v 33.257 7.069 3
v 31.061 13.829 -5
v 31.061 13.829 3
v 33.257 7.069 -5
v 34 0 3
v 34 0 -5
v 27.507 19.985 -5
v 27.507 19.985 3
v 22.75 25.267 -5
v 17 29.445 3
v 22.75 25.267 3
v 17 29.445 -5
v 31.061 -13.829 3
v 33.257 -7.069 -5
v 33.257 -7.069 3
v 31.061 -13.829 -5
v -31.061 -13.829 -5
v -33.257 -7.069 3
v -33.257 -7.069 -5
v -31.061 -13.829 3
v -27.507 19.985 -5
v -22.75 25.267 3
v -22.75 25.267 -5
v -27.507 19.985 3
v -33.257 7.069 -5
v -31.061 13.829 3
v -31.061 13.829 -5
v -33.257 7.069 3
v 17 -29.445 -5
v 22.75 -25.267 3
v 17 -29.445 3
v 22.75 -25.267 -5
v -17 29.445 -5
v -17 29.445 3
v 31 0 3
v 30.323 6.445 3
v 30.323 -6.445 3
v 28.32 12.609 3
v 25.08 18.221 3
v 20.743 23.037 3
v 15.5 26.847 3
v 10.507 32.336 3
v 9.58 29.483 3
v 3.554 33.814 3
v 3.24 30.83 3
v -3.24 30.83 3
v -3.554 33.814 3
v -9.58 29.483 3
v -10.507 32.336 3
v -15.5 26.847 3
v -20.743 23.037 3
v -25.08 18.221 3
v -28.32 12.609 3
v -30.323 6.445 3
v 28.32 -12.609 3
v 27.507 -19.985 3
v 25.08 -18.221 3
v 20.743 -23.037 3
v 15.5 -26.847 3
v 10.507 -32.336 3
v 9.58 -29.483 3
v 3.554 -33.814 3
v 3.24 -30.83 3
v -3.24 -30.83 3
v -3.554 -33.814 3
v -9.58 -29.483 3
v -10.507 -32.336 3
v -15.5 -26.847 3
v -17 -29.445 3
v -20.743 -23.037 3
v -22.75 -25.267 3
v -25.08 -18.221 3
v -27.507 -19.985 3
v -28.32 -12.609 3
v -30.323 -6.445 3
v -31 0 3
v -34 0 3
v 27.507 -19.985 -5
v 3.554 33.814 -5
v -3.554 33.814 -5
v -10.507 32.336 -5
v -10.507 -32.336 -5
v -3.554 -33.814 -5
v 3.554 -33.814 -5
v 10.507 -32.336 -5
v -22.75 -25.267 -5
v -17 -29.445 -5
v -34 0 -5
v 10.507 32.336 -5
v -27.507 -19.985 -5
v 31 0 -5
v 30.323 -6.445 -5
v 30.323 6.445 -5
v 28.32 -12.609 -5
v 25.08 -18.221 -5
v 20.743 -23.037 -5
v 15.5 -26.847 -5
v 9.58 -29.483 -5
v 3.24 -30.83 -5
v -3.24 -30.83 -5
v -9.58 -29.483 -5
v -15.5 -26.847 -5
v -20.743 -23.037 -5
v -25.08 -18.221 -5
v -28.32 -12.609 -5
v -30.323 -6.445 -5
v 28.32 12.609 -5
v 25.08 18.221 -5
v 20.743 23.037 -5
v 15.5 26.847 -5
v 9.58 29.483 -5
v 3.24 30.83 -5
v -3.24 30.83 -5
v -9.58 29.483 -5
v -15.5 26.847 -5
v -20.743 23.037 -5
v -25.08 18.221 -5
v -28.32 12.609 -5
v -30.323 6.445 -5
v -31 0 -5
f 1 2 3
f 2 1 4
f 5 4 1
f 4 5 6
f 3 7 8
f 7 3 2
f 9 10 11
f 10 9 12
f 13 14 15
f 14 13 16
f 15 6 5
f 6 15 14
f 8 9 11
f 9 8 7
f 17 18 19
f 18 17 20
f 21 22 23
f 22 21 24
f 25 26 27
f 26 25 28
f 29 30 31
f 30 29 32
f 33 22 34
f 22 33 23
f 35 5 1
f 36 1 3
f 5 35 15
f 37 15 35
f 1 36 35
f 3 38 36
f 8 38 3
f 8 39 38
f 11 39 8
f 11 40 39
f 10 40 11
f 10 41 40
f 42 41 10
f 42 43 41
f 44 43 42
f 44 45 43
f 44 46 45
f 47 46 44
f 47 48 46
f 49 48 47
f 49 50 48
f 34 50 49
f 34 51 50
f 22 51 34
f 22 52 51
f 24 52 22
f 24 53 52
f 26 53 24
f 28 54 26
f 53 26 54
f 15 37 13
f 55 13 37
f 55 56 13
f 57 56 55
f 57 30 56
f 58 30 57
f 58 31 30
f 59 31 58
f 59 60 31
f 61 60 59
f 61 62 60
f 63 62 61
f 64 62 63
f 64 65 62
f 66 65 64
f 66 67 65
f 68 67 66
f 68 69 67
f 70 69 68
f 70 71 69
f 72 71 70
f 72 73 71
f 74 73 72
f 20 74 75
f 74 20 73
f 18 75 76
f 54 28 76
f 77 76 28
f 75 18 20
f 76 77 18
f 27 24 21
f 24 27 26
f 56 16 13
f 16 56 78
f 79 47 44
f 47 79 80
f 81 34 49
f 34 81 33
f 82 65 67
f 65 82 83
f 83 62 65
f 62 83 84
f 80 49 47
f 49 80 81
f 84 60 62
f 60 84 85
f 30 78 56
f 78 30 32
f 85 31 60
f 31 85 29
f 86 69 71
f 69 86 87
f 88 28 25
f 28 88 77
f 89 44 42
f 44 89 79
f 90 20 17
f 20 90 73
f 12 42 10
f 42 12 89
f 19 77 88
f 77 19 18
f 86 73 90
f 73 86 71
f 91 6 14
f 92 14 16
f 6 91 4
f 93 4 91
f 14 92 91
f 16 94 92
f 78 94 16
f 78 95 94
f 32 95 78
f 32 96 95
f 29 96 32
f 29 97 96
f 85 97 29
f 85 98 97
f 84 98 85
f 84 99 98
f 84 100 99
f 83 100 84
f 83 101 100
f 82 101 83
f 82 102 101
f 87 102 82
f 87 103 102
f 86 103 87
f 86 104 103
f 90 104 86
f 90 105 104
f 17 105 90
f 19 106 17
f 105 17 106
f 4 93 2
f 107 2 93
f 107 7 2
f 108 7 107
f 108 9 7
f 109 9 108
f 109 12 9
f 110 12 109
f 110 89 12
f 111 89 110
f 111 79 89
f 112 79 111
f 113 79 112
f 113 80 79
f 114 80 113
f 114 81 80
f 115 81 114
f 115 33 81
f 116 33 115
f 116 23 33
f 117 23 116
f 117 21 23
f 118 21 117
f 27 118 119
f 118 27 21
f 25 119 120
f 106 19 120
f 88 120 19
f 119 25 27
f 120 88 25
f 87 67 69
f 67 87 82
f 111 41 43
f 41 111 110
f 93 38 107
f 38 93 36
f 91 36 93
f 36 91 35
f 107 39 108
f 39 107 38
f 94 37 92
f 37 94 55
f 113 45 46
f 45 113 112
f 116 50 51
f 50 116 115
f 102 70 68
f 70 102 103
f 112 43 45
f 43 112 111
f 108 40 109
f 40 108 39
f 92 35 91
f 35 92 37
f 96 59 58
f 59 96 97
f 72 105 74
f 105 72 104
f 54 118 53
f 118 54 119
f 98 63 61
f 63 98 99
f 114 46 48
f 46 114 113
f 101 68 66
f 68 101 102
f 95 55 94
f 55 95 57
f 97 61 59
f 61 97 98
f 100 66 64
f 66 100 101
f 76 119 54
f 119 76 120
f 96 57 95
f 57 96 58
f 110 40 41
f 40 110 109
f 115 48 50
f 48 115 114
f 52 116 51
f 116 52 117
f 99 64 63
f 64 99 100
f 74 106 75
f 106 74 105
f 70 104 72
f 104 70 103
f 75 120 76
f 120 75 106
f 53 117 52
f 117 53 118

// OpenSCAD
holes=5;
layer_h= 4;
radius = 30;
space=30; // degrees
distance= 22;
valve_r = 3.5;
border = 3;
offset = 1.0;
module arm(x, y, z, d) {
CubePoints = [
  [  0,  0,  0 ],  //0
  [ x,  0,  0 ],  //1
  [ x-d,  y,  0 ],  //2
  [ 0+d, y,  0 ],  //3
  [ 0,  0,  z ],  //4
  [ x,  0,  z ],  //5
  [ x-d,  y,  z ],  //6
  [ 0+d,  y,  z ]]; //7
  
CubeFaces = [
  [0,1,2,3],  // bottom
  [4,5,1,0],  // front
  [7,6,5,4],  // top
  [5,6,2,1],  // right
  [6,7,3,2],  // back
  [7,4,0,3]]; // left
  
 polyhedron( CubePoints, CubeFaces );    
 translate([0,0,z]) rotate([180,0,0]) polyhedron( CubePoints, CubeFaces );
 translate([x/2,y,0]) cylinder(h=z, r=(x/2)-d);
 translate([x/2,-y,0]) cylinder(h=z, r=(x/2)-d);
 translate([x/2,0,0]) cylinder(h=z*2.5, r=(x/2) * 1.2);
}
module servo() {
  import("/Users/wooga/Downloads/microServo-sg90.stl");    
};
// $fn = 50;

*difference() {
  x = 20;
  translate([-x/2,-x,0]) cube([x,x * 2, x/3]);
  translate([-3,0,-0.1]) arm(6, 15, 2, 1);
 }
union() {    
    difference() {
        union() {
            cylinder(r=radius, h=layer_h*0.7);
            layers = 10;
            h = 0.2;
            for(i=[0:layers]){
              translate([0,0,layer_h * 0.7 + i * h]) cylinder(r=radius + (i*h), h);
             }
            
            !translate([0,0,-layer_h - 1]) difference() {
                cylinder(r=radius + offset + border, h=layer_h * 2);
                translate([0,0,-0.1]) cylinder(r=radius + offset, h=(layer_h * 2) + 0.2);
            }
            for(i=[0:holes]) {        
                translate([distance * sin(i * space),
                           distance * cos(i * space), 
                           layer_h]) {
                  cylinder(r=valve_r + 0.5, h=layer_h * 2.5);
                }    
            }    
        }
        for(i=[0:holes]) {        
            translate([distance * sin(i * space),
                       distance * cos(i * space), 
                       -10]) {
              cylinder(r=valve_r - 1, h=100);
              translate([0,0,9]) sphere(r=valve_r * 1.2);
            }    
        }
        translate([0,0,-1]) cylinder(r=2.3, h=100);
        rotate([0,180,0]){
          translate([-3,0, -layer_h - 1.1]) arm(6, 15, 2.2, 1);
          
        }
    }
}

translate([0,0, (-2 * layer_h - 0)]) difference() {
  union() {
    difference() {
      cylinder(r=radius, h=layer_h * 2);
      translate([radius/3, -radius, -0.1]) cube([radius * 2, radius * 2, layer_h * 2 + 1]);
      rotate([0,180,0]) translate([radius/3, -radius, -layer_h * 2 - 0.1]) cube([radius * 2, radius * 2, layer_h * 2 + 1]);
    }
    translate([0, -distance, -8]) cylinder(r=valve_r, h=layer_h * 2);
    translate([-radius/3, radius - border,0]) cube([(2 * radius/3),radius * 0.9, layer_h - offset]);
  }
  translate([0, -(distance * cos(0)), -10]) cylinder(r=valve_r - 1.5, h=layer_h * 5);
  scale(1.05) rotate([0,0,90]) translate([-6,-6,-18.5]) servo();
  translate([0, 20, -20]) cylinder(r=1.2, h=100);
  translate([0, -9, -20]) cylinder(r=1.2, h=100);
}
